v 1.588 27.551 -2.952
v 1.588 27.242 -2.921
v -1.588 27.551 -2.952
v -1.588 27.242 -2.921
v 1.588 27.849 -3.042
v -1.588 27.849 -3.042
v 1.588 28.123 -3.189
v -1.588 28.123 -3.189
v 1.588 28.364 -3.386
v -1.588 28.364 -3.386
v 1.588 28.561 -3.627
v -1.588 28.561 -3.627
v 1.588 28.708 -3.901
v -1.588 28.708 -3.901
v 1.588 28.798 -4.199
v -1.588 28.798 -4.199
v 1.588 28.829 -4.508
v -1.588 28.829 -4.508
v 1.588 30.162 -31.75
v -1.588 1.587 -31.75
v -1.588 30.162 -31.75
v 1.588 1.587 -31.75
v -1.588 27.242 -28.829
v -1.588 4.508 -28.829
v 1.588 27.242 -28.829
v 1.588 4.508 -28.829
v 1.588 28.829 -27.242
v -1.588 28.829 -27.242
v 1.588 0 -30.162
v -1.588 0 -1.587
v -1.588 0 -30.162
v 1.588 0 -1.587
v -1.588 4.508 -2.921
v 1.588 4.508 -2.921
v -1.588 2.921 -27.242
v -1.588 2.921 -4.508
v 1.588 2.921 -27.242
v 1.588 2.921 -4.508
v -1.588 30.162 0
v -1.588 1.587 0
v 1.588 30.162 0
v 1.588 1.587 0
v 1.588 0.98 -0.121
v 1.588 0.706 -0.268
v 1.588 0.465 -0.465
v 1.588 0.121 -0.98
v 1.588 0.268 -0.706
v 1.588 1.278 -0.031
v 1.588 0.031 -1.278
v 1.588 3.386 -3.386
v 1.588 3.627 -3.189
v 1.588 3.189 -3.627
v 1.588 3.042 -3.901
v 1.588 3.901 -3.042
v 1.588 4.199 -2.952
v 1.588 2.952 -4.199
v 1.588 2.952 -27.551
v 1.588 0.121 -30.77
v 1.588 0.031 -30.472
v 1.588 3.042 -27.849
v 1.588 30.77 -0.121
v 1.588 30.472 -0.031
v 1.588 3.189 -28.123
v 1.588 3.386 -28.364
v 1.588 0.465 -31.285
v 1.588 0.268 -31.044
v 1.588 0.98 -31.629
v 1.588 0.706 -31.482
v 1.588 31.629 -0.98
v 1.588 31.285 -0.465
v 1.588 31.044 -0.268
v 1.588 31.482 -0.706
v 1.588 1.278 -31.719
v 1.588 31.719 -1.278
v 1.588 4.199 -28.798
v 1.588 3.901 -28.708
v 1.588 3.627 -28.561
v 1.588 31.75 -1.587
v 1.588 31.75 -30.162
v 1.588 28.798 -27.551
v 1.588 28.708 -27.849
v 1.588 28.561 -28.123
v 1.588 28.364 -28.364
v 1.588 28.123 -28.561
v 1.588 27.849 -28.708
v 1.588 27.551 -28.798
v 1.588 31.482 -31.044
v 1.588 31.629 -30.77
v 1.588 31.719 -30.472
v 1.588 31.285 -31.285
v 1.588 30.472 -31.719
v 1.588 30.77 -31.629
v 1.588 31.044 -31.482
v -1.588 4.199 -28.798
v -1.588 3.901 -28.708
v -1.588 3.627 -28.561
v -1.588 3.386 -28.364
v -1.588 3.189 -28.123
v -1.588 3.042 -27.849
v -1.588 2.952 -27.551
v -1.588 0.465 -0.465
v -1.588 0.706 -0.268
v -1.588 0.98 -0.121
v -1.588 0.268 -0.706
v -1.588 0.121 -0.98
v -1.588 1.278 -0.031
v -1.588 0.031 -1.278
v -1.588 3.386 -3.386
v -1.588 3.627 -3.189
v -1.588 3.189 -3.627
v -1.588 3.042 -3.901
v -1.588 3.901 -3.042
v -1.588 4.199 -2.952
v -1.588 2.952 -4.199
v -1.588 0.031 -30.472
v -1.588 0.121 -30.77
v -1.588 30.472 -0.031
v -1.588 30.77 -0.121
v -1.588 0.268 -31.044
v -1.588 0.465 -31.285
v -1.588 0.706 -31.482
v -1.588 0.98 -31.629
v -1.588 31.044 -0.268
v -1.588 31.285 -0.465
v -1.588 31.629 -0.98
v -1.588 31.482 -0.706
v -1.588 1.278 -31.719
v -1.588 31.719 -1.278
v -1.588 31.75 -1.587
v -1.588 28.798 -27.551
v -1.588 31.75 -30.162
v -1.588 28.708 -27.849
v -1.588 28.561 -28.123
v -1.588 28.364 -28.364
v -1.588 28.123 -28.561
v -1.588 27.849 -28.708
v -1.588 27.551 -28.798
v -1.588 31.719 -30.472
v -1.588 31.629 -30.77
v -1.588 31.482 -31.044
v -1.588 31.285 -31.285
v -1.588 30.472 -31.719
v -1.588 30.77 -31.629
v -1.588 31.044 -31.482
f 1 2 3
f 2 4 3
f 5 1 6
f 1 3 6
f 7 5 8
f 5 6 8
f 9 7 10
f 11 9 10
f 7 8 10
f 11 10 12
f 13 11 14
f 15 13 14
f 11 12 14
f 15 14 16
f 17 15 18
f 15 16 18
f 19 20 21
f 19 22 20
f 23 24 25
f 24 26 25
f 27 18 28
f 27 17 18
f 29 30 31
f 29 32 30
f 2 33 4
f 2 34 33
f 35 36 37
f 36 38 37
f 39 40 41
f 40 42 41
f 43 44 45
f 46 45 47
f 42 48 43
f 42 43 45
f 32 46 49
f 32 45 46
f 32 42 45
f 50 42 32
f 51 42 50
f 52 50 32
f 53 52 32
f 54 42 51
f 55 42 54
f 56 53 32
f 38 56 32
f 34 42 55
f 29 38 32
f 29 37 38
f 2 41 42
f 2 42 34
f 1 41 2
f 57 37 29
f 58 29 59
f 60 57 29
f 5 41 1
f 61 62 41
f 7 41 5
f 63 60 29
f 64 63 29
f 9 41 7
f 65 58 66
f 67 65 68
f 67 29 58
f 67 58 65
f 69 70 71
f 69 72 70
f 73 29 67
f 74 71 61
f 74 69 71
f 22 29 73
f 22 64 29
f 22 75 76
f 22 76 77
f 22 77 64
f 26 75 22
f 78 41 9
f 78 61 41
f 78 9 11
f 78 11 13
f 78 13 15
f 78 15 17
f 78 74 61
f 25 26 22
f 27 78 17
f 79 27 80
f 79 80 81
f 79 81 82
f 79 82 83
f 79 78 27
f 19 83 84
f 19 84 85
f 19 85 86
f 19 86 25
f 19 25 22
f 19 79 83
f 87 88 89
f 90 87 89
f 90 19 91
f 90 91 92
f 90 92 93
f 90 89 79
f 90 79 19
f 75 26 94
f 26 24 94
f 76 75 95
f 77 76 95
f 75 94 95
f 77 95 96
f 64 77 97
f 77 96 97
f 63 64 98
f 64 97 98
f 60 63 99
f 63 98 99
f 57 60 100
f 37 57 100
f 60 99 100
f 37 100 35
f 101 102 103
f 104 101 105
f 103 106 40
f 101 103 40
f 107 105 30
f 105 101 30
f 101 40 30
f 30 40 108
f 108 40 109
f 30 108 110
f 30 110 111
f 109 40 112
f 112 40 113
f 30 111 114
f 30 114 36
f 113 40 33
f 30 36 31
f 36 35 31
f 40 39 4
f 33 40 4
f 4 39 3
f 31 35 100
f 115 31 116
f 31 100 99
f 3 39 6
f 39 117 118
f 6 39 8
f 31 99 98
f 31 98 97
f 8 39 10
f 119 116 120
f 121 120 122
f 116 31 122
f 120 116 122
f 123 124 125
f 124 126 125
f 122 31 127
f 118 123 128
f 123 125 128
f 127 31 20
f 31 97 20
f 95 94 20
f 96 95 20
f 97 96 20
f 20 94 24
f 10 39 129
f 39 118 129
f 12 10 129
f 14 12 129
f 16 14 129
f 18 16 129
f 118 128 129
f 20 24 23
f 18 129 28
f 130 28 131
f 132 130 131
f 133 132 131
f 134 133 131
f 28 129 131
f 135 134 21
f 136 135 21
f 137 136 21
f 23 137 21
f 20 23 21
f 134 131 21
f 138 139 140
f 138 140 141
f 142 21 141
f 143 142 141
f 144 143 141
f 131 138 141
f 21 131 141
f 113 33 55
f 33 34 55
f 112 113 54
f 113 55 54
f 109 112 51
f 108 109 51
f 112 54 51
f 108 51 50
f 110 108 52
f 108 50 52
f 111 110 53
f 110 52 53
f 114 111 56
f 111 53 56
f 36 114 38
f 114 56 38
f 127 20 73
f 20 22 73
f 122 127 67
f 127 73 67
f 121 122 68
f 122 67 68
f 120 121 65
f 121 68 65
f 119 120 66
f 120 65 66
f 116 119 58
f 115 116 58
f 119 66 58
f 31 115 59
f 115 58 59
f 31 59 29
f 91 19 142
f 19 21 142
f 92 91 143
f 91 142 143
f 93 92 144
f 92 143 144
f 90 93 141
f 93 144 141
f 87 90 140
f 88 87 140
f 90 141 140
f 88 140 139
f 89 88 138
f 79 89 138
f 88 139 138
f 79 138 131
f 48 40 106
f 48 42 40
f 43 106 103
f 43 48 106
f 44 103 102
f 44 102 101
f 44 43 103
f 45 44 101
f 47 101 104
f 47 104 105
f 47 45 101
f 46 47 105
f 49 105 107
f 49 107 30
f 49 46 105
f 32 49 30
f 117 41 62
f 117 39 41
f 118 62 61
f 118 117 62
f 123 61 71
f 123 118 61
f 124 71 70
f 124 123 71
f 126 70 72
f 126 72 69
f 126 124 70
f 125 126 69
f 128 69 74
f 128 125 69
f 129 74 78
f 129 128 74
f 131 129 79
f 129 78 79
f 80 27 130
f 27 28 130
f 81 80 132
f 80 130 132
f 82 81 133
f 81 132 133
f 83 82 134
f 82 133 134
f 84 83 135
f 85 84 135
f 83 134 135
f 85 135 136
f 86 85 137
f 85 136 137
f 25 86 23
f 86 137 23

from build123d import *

# Parameters (mm, degrees)
SKETCH1_W           = 31.75
SKETCH1_H           = 31.75
SKETCH1_W_2         = 25.908
SKETCH1_H_2         = 25.908
BOSS_EXTRUDE1_DEPTH = 1.5875
FILLET1_R           = 1.5875


with BuildPart() as part:
    # Sketch1 → Boss-Extrude1 (new, symmetric)
    with BuildSketch(Plane(origin=(0, 0, 0), x_dir=(0, 0, -1), z_dir=(1, 0, 0))):
        with Locations((15.875, 15.875)):
            Rectangle(SKETCH1_W, SKETCH1_H)
        with Locations((15.875, 15.875)):
            Rectangle(SKETCH1_W_2, SKETCH1_H_2, mode=Mode.SUBTRACT)
    extrude(amount=BOSS_EXTRUDE1_DEPTH, both=True)

    # Fillet1
    fillet1_edges = [part.edges().sort_by_distance(p)[0] for p in [
        (0, 2.921, -2.921),
        (0, 2.921, -28.829),
        (0, 28.829, -28.829),
        (0, 28.829, -2.921),
        (0, 31.75, 0),
        (0, 31.75, -31.75),
        (0, 0, -31.75),
        (0, 0, 0),
    ]]
    fillet(fillet1_edges, radius=FILLET1_R)


solid = part.part
